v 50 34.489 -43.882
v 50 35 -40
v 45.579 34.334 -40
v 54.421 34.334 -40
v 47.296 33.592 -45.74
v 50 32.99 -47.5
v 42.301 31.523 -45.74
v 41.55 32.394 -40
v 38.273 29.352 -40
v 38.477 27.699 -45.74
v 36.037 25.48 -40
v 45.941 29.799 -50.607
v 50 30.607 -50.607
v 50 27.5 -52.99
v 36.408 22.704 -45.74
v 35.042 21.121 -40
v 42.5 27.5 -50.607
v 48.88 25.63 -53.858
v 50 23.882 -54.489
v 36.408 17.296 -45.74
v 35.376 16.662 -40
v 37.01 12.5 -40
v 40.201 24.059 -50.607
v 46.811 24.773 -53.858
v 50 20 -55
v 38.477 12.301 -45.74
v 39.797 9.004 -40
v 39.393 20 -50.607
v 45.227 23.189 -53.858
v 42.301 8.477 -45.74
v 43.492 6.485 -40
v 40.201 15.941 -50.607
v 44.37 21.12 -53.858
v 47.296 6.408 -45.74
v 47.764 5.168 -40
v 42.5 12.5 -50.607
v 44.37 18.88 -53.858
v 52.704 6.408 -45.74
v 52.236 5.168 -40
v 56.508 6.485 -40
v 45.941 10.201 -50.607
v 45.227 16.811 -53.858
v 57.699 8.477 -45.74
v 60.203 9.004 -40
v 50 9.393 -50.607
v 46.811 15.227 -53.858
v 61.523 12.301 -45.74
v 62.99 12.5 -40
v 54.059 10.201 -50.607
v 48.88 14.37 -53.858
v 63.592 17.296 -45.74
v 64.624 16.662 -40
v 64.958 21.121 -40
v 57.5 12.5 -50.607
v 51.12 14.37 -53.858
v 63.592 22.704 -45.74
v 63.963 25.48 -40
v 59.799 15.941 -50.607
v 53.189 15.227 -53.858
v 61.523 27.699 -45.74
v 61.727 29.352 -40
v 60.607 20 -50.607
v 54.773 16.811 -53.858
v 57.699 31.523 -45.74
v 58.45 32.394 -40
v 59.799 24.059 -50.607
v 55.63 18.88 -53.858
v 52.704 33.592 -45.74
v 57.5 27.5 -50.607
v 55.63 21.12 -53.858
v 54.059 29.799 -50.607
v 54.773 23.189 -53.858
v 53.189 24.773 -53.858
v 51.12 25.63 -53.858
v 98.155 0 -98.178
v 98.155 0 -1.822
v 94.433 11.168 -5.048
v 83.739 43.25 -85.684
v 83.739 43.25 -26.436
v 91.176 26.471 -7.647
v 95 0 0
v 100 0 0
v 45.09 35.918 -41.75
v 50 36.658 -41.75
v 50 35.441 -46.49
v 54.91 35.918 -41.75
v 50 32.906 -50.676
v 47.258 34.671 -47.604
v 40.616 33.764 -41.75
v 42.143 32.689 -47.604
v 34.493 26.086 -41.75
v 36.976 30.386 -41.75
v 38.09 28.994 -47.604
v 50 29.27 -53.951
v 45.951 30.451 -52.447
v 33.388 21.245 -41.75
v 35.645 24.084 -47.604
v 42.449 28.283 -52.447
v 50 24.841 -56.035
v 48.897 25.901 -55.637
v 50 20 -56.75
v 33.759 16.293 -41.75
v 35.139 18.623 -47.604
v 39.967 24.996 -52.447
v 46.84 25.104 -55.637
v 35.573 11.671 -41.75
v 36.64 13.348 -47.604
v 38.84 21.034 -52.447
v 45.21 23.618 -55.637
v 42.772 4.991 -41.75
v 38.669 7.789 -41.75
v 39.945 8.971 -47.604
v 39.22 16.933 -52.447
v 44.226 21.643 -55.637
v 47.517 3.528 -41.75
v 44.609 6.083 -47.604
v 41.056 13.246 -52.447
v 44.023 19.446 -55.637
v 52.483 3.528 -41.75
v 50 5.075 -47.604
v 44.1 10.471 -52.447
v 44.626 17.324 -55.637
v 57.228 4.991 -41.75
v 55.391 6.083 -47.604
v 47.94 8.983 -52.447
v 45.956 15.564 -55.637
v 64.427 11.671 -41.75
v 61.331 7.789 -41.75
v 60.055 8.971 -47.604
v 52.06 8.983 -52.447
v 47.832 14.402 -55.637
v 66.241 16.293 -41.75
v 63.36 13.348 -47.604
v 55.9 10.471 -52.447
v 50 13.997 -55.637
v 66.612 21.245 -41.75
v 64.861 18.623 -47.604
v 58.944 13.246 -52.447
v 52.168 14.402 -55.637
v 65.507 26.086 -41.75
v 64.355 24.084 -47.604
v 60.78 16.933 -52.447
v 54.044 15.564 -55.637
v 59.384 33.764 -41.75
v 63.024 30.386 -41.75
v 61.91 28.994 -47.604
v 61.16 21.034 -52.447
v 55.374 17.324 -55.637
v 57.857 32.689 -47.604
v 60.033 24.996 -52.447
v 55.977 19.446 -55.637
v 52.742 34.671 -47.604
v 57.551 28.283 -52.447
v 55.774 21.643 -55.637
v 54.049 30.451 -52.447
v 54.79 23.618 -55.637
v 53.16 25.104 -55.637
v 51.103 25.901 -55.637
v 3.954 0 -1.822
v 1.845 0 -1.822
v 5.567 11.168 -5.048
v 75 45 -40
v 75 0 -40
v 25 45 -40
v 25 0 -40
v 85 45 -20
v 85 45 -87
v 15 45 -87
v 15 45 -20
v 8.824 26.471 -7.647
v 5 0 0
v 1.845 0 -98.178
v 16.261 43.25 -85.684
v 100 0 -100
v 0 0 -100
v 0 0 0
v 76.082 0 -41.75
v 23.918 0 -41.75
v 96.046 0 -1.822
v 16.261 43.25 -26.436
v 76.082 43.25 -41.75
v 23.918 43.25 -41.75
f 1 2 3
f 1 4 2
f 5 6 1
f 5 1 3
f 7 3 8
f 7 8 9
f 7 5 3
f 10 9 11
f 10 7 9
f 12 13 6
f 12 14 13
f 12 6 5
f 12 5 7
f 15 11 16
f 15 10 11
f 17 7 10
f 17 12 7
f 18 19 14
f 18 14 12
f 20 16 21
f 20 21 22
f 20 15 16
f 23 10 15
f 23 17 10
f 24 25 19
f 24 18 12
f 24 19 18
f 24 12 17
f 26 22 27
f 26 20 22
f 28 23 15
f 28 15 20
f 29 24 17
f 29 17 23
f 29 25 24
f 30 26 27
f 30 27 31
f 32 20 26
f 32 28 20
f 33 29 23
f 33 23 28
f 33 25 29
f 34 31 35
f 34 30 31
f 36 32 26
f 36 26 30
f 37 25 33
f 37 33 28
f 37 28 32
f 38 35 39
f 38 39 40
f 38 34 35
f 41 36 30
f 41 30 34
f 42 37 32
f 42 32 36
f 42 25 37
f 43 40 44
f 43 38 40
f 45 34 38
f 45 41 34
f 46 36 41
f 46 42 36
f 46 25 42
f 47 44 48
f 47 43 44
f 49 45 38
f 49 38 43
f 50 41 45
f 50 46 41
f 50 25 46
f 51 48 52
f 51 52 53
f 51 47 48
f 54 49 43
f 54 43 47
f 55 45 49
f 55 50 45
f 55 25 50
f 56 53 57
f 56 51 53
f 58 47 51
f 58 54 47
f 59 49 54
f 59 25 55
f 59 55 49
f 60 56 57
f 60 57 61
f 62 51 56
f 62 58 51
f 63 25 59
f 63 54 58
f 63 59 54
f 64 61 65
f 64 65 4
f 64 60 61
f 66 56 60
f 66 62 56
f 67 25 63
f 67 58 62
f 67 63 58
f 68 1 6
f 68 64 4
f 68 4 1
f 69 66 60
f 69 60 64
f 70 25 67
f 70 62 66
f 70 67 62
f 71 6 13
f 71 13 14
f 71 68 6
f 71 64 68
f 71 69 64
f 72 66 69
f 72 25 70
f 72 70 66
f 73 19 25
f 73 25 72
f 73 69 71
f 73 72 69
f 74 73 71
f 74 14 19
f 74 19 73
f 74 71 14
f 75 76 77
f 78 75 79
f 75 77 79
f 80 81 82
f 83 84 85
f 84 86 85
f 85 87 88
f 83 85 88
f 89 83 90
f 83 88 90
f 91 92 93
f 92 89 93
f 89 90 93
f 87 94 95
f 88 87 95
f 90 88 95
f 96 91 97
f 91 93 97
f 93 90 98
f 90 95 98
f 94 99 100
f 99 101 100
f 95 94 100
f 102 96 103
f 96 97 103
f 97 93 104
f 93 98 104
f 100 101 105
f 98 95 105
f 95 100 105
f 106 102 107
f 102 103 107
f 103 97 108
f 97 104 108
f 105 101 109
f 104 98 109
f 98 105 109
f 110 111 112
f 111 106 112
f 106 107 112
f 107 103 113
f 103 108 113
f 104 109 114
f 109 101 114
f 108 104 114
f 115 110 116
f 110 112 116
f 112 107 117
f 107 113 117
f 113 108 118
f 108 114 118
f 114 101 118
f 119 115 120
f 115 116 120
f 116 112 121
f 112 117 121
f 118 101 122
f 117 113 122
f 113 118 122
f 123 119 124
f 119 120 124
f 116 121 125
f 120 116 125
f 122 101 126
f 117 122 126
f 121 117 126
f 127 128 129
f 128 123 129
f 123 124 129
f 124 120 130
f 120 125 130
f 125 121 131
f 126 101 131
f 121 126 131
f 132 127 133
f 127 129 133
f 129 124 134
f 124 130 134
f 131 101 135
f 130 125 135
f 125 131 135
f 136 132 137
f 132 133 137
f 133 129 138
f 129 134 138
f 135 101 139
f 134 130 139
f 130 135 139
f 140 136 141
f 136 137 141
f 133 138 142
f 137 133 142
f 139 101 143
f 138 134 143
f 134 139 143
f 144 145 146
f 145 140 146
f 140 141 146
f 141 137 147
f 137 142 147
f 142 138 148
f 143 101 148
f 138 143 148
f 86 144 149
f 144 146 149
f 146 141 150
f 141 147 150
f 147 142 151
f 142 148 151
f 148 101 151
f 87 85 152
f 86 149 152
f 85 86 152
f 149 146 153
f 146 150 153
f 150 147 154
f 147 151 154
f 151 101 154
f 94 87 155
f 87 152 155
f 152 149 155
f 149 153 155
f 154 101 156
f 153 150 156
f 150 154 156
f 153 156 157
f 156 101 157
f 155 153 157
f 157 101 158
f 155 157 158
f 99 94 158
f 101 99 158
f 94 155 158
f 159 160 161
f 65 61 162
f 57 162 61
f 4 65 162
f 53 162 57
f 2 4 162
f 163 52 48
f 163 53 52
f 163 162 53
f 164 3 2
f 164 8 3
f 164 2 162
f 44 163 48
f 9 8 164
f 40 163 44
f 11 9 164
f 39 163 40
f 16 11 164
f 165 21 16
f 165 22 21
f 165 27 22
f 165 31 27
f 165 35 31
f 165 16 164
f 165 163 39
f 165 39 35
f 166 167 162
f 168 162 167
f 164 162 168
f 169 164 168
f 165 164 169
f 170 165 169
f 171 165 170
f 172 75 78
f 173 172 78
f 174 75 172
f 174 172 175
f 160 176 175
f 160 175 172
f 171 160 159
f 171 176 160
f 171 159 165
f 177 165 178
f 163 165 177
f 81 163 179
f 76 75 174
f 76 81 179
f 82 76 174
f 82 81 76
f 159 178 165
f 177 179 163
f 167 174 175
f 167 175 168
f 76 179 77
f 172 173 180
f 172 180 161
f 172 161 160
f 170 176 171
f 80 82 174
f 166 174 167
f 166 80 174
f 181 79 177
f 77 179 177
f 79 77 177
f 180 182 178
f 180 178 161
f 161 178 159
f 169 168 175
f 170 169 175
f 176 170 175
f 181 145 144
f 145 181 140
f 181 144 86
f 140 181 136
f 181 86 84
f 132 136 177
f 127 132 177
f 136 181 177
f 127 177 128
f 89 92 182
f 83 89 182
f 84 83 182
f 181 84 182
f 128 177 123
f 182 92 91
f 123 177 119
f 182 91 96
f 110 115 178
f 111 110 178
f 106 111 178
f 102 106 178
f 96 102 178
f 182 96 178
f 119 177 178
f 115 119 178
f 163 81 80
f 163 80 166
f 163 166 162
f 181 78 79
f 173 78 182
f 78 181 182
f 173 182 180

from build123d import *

# Parameters (mm, degrees)
GRUNDK_RPER_DEPTH               = 100
SCHRAEGEN_VORNE_DEPTH           = 100
SCHNITT_LINEAR_AUSTRAGEN4_DEPTH = 45
WANDUNG1_T                      = -1.75


with BuildPart() as part:
    # Skizze1 → Grundkörper (new body)
    with BuildSketch(Plane.XY):
        Polygon((0, 0), (100, 0), (85, 45), (15, 45), align=None)
    extrude(amount=-GRUNDK_RPER_DEPTH)

    # Skizze2 → Schraegen_vorne (cut)
    with BuildSketch(Plane(origin=(0, 0, 0), x_dir=(0, 0, -1), z_dir=(1, 0, 0))):
        Polygon((100, 0), (87, 45), (100, 45), align=None)
    schraegen_vorne = extrude(amount=SCHRAEGEN_VORNE_DEPTH, mode=Mode.SUBTRACT)

    # Spiegel_Schraege_hinten: Schraegen_vorne across plane
    add(schraegen_vorne.mirror(Plane.XY.offset(-50)), mode=Mode.SUBTRACT)

    # Skizze4 → Schnitt-Linear austragen4 (cut)
    with BuildSketch(Plane.XZ):
        Polygon((5, 0), (95, 0), (75, -40), (25, -40), align=None)
    extrude(amount=-SCHNITT_LINEAR_AUSTRAGEN4_DEPTH, mode=Mode.SUBTRACT)

    # Skizze6 → Schnitt-Rotation1 (revolve, cut)
    with BuildSketch(Plane.ZY.offset(-50), mode=Mode.PRIVATE) as schnitt_rotation1_sk:
        with BuildLine():
            Line((-55, 20), (-40, 20))
            Line((-40, 20), (-40, 5))
            ThreePointArc((-40, 5), (-50.606601718, 9.393398282), (-55, 20))
        make_face()
    revolve(schnitt_rotation1_sk.sketch.rotate(Axis((50, 20, -127.890936505), (0, 0, 1)), 180), axis=Axis((50, 20, -127.890936505), (0, 0, 1)), mode=Mode.SUBTRACT)

    # Wandung1
    wandung1_openings = [part.faces().sort_by_distance(p)[0] for p in [
        (50, 0, -62.407407407),
    ]]
    offset(amount=WANDUNG1_T, openings=wandung1_openings, kind=Kind.INTERSECTION)


solid = part.part
